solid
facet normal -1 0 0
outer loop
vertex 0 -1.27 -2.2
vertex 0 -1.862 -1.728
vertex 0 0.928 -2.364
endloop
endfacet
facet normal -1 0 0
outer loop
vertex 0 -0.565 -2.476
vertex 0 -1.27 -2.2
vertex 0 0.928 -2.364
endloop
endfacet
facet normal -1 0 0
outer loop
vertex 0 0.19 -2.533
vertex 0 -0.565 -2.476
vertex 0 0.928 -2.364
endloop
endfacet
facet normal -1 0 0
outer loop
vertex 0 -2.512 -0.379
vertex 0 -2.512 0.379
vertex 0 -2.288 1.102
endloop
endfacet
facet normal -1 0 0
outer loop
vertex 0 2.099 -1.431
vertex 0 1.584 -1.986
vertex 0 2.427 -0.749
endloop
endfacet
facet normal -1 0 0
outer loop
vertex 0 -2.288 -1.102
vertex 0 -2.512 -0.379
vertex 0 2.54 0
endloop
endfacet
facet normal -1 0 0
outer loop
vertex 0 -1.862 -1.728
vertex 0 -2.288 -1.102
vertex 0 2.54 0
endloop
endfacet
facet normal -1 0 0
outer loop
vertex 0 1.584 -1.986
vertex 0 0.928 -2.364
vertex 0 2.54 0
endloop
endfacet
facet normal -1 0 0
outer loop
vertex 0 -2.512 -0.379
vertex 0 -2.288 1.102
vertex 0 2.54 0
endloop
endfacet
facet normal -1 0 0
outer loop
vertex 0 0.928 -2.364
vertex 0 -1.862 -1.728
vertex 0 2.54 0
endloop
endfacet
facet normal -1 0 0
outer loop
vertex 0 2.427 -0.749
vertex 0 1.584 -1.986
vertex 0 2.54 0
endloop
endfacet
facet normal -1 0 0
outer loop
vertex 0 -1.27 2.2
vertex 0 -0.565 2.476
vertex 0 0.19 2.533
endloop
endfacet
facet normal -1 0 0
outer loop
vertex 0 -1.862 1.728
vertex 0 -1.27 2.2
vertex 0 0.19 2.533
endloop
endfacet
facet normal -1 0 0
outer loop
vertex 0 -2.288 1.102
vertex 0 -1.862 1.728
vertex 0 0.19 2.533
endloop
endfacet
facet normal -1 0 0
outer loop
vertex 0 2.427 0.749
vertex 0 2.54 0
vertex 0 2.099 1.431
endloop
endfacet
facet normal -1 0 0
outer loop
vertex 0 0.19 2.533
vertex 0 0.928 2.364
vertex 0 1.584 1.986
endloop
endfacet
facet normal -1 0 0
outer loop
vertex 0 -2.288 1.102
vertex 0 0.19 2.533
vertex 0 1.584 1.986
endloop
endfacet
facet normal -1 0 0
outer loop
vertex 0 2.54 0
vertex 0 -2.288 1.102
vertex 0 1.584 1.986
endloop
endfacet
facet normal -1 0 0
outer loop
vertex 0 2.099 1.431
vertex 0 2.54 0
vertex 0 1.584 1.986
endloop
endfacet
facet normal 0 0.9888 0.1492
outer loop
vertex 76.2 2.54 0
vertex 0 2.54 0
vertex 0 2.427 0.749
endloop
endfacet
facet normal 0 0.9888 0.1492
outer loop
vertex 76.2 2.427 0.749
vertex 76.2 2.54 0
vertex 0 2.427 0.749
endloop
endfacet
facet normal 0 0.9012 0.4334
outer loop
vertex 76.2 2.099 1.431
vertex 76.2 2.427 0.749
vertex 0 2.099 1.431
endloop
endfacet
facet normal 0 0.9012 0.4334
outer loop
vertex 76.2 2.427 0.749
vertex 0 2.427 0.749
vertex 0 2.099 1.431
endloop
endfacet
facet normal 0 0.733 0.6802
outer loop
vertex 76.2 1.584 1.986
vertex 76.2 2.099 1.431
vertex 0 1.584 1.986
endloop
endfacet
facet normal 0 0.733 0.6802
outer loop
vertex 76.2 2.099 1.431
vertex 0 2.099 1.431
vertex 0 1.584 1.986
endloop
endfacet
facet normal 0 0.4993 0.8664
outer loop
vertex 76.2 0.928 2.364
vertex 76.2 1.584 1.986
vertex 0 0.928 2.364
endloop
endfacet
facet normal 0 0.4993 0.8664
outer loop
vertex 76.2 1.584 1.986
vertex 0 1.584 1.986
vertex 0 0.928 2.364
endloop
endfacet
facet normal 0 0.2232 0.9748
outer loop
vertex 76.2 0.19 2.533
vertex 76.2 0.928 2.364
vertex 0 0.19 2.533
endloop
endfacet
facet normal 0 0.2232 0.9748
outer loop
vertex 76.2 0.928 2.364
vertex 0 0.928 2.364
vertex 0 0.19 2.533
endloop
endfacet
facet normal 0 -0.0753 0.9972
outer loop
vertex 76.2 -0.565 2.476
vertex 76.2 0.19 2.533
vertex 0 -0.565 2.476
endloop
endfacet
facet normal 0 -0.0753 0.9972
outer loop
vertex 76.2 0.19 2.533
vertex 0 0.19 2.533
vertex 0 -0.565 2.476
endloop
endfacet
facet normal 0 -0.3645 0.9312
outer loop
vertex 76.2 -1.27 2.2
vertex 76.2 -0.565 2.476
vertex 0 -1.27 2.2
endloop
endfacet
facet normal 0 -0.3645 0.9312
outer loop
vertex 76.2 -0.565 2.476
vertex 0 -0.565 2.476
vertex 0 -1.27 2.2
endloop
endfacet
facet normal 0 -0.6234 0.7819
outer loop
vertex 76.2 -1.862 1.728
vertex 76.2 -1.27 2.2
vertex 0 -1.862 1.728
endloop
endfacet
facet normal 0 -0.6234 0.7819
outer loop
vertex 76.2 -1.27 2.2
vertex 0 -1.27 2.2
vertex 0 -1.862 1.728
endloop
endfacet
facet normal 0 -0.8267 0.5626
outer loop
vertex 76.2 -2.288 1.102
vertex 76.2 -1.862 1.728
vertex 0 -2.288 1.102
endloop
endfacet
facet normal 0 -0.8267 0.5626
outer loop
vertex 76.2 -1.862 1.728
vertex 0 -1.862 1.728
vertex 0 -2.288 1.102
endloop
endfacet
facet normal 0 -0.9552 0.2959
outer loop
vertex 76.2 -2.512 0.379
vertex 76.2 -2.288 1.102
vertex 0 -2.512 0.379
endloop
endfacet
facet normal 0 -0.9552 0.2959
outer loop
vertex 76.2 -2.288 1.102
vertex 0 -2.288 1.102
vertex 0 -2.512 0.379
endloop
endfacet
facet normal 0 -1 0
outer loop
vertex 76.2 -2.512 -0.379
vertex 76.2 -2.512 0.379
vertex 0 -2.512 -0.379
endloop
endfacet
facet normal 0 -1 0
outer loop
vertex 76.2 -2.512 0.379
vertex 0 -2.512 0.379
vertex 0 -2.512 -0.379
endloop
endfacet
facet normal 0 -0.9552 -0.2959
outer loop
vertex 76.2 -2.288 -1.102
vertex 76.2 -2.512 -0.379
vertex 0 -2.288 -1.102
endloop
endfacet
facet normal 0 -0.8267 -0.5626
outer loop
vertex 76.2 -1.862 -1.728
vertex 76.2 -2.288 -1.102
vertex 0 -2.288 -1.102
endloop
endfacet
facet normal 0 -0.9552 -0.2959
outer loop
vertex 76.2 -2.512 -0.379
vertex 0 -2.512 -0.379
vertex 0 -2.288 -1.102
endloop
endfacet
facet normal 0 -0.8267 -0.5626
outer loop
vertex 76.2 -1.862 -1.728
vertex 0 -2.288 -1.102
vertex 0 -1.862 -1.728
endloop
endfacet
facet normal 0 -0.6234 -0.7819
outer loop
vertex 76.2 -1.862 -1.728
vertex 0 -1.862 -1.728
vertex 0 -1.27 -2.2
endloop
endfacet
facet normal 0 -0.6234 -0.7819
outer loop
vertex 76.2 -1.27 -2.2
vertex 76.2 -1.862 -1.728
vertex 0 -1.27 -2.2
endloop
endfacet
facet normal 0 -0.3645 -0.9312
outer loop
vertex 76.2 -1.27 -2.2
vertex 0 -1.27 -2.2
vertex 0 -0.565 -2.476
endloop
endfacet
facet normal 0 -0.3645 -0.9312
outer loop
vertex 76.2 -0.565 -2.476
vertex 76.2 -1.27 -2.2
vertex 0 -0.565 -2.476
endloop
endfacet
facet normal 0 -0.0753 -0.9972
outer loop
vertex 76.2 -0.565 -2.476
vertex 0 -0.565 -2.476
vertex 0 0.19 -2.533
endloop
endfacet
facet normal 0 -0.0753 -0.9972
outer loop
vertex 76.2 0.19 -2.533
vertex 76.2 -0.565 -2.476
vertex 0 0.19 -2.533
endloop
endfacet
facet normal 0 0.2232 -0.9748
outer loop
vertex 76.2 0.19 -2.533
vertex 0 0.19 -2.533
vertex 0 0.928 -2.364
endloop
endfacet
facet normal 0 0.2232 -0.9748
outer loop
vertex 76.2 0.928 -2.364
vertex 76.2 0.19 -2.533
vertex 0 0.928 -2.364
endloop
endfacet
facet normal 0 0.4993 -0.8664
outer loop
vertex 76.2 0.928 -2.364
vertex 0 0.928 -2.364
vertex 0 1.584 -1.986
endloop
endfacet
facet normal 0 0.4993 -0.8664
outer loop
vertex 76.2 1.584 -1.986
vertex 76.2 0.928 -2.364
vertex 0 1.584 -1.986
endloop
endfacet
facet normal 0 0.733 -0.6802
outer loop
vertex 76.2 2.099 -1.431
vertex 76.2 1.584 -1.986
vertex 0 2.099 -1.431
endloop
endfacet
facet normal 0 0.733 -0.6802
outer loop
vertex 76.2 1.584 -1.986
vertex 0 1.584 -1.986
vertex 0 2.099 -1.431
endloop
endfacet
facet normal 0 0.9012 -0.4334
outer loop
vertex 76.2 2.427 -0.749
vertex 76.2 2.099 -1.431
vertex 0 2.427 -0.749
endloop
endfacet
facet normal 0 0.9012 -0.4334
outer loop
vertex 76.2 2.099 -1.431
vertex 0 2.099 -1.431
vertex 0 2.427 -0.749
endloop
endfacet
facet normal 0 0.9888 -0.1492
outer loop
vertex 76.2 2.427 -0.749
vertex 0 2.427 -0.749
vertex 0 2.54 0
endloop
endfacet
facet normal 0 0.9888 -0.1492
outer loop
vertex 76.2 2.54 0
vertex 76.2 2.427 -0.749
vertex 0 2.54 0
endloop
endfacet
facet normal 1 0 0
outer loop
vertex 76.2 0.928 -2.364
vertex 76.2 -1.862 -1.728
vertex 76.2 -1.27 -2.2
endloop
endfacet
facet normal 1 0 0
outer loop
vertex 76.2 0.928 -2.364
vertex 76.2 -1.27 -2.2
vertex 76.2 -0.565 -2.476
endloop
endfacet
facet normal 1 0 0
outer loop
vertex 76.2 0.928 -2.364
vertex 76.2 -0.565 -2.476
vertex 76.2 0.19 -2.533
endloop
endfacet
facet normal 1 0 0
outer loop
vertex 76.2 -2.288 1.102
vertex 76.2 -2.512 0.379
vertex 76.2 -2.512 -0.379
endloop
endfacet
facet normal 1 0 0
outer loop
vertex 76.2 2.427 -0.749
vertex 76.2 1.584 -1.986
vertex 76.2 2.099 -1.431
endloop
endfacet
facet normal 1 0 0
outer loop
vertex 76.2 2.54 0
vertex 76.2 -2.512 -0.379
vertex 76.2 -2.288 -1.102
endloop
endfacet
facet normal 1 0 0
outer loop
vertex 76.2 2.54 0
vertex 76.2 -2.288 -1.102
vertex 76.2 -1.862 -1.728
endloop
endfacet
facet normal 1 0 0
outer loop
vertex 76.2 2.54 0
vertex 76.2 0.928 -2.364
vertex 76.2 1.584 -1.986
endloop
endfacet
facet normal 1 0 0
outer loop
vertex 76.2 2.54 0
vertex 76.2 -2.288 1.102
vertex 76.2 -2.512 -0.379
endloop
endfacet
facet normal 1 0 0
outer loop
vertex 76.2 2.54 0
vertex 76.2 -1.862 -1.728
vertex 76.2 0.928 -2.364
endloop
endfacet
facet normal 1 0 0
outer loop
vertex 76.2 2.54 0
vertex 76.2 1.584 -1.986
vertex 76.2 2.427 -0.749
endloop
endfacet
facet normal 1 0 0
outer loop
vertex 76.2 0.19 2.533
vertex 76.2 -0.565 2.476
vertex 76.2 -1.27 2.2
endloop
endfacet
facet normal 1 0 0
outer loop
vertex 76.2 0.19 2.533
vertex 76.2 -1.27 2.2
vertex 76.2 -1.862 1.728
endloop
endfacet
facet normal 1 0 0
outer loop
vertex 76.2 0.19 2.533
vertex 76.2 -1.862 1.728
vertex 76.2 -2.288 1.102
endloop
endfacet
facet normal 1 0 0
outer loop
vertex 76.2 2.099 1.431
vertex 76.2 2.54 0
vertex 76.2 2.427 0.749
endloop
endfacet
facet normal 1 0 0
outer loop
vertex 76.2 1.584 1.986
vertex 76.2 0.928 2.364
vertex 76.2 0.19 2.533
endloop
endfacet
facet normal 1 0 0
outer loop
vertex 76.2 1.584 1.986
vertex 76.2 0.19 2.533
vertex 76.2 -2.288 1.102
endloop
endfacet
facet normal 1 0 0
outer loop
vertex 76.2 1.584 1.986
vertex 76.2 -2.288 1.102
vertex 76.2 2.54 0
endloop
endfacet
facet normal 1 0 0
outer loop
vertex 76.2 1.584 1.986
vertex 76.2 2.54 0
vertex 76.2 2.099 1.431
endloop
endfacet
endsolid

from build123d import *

# Parameters (mm, degrees)
F0_R     = 2.442894711
F1_DEPTH = 58.42
F3_R     = 2.54
F4_DEPTH = 76.2


with BuildPart() as f1:
    # F0 (on Front) → F1 (new body)
    with BuildSketch(Plane.XZ):
        Circle(F0_R)
    extrude(amount=F1_DEPTH)


with BuildPart() as f4:
    # F3 (on Right) → F4 (new body)
    with BuildSketch(Plane.YZ):
        Circle(F3_R)
    extrude(amount=F4_DEPTH)


solid = f4.part
